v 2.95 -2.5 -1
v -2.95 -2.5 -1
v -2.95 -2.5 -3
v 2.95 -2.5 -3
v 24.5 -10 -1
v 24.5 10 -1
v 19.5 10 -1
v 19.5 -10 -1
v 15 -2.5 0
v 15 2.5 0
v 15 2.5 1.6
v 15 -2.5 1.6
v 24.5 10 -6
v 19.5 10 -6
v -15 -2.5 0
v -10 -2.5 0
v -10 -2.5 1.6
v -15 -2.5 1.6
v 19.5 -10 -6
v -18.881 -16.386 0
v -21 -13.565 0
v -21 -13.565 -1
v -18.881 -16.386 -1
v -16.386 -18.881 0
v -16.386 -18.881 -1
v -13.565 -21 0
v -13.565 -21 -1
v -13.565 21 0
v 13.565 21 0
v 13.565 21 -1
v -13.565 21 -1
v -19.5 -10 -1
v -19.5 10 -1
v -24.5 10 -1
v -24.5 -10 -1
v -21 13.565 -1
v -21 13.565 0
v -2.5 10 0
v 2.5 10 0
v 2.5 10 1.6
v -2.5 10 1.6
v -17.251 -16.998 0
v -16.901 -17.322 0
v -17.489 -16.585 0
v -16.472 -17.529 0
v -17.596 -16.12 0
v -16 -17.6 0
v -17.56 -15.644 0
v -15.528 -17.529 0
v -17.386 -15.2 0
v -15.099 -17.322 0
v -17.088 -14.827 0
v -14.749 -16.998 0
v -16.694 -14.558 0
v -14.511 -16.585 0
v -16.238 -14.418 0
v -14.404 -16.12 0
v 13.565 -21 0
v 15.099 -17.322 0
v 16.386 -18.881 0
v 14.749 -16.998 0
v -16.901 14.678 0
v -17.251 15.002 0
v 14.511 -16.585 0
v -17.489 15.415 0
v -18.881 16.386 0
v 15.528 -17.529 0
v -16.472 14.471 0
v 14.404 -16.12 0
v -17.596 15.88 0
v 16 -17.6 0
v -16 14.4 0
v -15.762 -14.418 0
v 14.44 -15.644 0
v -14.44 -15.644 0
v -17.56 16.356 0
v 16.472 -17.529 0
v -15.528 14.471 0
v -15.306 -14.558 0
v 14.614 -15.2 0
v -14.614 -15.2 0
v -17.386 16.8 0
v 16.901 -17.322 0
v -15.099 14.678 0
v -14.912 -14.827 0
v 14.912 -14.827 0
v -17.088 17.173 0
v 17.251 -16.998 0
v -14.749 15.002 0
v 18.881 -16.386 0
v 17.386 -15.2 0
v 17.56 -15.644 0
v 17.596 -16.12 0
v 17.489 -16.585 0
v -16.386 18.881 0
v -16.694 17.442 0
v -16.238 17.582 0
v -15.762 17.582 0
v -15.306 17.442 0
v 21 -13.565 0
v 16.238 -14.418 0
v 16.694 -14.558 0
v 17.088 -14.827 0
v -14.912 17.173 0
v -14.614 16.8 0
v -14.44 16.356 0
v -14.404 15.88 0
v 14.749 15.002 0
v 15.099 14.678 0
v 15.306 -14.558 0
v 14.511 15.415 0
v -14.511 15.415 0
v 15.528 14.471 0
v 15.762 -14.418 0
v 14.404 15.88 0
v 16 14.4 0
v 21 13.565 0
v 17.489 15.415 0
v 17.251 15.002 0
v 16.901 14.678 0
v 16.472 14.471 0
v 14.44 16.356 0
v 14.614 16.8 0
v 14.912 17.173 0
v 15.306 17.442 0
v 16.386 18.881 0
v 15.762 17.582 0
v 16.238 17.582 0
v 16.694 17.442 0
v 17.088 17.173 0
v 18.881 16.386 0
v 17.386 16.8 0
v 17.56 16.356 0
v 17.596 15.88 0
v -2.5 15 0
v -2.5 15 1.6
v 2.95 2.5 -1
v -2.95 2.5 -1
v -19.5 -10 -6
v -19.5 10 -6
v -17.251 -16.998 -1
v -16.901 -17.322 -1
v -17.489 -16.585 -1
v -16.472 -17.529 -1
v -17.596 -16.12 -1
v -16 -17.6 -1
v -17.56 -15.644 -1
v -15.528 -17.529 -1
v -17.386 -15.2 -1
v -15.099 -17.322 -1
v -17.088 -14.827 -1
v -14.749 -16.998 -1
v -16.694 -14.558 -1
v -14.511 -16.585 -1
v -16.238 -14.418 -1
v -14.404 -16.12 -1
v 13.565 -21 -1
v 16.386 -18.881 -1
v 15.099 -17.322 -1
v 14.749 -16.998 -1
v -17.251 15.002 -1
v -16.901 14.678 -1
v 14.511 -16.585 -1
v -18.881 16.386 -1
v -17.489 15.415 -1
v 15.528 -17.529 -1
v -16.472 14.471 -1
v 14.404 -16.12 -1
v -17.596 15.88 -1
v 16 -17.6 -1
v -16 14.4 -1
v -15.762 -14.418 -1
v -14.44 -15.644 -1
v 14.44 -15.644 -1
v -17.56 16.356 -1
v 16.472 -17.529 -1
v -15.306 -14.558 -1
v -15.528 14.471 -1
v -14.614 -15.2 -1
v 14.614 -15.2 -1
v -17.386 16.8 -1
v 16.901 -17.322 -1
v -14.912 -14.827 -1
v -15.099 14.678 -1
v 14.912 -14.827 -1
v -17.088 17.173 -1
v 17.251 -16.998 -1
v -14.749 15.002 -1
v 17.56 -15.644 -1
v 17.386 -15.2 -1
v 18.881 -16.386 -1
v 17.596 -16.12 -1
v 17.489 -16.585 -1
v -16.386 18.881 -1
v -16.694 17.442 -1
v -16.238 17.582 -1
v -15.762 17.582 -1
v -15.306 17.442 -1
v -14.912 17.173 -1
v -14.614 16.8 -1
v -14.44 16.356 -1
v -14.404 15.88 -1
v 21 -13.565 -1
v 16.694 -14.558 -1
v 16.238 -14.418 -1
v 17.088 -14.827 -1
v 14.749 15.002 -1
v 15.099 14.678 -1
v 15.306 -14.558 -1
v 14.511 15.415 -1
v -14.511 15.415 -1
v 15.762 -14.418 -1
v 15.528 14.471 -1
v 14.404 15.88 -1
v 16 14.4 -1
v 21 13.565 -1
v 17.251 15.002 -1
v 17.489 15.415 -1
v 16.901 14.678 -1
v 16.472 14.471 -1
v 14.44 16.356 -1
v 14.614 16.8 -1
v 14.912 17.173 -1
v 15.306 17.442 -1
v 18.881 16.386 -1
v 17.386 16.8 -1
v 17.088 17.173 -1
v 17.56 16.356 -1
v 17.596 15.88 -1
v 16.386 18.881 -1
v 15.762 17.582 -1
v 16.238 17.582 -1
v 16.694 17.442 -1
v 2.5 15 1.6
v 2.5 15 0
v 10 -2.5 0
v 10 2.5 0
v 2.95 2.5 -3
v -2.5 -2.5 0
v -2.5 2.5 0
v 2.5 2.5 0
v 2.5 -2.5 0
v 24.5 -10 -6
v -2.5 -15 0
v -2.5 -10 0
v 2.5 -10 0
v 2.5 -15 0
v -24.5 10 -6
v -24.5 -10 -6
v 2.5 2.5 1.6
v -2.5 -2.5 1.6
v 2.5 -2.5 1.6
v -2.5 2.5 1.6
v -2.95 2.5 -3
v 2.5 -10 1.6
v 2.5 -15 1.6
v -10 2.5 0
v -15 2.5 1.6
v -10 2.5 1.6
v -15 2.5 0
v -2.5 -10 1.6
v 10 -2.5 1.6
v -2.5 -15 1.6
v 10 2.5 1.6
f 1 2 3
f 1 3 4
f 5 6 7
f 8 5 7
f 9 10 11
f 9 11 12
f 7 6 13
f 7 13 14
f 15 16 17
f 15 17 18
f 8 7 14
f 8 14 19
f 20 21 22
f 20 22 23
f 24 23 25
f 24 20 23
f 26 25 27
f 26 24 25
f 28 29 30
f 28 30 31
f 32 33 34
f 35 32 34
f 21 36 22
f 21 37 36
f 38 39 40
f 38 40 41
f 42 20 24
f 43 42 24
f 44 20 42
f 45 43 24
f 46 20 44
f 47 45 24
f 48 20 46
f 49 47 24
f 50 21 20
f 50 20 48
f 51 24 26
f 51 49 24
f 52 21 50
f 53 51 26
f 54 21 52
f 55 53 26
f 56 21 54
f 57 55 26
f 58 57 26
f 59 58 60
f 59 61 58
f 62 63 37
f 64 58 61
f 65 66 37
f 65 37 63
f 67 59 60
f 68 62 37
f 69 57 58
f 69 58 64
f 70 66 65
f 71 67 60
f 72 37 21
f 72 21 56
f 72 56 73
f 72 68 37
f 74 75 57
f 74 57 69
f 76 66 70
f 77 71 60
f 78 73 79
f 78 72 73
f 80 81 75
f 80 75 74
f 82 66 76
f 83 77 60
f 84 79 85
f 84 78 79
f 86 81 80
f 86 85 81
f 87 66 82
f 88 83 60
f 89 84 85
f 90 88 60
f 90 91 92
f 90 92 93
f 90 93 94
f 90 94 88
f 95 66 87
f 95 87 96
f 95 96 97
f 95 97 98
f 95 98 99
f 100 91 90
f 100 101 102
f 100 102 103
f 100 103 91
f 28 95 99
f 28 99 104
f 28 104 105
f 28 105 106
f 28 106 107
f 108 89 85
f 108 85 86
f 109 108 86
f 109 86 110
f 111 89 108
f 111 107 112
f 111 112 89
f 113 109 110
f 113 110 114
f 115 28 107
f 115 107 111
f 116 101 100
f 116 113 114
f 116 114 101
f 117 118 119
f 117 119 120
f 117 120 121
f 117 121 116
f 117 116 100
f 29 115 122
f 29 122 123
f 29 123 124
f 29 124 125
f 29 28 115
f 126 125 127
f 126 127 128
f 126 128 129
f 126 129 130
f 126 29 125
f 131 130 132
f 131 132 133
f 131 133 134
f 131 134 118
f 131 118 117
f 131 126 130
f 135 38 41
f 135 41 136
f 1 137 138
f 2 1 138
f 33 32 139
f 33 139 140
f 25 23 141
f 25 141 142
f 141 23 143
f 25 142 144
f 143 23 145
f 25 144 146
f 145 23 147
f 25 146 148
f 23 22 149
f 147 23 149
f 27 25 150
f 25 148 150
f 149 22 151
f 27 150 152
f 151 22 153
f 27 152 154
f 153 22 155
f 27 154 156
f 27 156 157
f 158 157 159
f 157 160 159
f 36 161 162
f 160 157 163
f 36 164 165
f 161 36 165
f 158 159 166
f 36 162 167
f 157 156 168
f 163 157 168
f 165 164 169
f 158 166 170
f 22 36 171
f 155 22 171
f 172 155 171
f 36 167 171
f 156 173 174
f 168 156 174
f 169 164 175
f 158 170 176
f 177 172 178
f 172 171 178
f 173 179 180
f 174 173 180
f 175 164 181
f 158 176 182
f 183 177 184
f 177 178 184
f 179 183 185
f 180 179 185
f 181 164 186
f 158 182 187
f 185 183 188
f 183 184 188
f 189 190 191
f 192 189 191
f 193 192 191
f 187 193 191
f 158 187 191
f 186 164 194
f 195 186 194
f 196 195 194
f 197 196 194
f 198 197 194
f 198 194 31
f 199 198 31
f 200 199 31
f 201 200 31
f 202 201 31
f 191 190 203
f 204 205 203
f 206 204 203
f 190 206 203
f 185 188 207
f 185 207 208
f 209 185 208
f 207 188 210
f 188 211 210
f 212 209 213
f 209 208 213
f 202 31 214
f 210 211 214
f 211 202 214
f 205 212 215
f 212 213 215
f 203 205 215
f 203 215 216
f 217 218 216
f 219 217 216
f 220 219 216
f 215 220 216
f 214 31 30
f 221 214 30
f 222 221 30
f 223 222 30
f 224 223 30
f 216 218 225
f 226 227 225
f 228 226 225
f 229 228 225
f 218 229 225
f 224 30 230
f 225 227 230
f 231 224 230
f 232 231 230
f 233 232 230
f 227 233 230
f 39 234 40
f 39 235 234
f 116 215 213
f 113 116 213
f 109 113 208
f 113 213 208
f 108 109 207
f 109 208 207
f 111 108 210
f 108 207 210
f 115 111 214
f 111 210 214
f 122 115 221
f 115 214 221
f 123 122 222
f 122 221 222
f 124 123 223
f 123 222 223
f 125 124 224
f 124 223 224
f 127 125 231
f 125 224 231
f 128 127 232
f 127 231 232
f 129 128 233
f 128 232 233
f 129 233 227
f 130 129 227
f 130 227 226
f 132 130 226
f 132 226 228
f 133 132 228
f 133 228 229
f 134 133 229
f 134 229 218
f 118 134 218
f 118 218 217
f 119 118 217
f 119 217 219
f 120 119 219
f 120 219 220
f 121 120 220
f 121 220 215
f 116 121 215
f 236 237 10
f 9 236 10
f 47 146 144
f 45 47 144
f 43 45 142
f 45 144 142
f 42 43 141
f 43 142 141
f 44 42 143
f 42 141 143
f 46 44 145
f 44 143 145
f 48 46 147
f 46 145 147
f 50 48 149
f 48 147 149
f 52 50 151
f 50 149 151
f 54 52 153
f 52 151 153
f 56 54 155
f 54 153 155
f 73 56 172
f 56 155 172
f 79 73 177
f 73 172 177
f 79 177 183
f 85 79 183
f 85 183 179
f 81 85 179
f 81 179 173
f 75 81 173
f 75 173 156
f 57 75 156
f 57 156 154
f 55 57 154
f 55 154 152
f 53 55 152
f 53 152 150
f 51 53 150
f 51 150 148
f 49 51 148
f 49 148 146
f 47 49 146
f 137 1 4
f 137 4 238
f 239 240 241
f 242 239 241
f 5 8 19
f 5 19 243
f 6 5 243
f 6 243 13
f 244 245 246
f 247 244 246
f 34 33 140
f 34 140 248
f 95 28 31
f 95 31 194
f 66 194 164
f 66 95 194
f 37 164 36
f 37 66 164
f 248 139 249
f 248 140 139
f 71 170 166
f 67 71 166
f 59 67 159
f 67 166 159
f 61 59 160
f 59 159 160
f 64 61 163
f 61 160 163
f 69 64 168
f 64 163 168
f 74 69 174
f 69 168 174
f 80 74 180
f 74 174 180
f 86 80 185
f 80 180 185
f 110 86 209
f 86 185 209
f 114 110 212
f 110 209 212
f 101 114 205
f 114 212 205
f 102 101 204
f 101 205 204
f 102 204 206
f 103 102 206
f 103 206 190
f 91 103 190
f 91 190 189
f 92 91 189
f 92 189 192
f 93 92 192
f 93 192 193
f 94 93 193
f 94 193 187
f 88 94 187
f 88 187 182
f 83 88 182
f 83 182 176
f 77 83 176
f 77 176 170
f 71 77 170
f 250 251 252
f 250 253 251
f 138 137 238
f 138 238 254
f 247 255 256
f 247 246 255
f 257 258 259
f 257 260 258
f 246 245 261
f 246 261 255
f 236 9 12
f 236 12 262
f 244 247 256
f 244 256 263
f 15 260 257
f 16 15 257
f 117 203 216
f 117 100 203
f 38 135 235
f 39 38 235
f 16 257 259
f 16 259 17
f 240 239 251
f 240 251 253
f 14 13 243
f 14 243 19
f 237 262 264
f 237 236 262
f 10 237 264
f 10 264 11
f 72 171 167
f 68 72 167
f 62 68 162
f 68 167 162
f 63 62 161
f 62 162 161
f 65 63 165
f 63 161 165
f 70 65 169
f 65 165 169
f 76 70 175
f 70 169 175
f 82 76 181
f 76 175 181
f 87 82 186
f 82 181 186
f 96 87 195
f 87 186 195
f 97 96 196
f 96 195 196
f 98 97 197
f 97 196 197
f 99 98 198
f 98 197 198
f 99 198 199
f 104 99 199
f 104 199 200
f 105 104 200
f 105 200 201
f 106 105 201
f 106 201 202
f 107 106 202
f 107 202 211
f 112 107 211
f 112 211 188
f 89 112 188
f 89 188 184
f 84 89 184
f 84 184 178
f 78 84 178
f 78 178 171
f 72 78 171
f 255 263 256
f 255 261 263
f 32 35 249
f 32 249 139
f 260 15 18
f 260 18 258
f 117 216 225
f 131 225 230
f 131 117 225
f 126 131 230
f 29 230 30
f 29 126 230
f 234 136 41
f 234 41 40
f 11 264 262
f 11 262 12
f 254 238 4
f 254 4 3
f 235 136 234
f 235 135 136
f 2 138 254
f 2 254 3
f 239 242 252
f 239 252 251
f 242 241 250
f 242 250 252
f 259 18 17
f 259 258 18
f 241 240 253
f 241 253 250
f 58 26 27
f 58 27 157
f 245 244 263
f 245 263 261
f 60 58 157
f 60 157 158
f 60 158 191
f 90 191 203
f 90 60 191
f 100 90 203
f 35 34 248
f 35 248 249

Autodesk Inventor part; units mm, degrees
ref_plane "YZ Plane" through (0, 0, 0) normal (1, 0, 0) x (0, 1, 0)
ref_plane "XZ Plane" through (0, 0, 0) normal (0, 1, 0) x (-1, 0, 0)
ref_plane "XY Plane" through (0, 0, 0) normal (0, 0, 1) x (1, 0, 0)
sketch "Skizze1" plane through (0, 0, 0) normal (0, 0, 1) x (1, 0, 0)
  circle A0 centre (0, 0) radius 25
  circle A1 centre (0, 0) radius 22.6274 construction
  line L0 (-16, 16) -> (16, 16) construction
  line L1 (16, 16) -> (16, -16) construction
  line L2 (16, -16) -> (-16, -16) construction
  line L3 (-16, -16) -> (-16, 16) construction
  line L4 (-21, -21) -> (21, -21)
  line L5 (21, -21) -> (21, 21)
  line L6 (21, 21) -> (-21, 21)
  line L7 (-21, 21) -> (-21, -21)
  line L8 (-21, -21) -> (21, 21) construction
  line L9 (21, -21) -> (-21, 21) construction
  point P0 (16, 16)
  dimension "d2" = 32
  dimension "d92" = 50
  dimension "d95" = 42
extrude "Extrusion1" add sketch "Skizze1" against normal blind 1 contours A0 L5 | L5 A0 L4 L7 L6 | L6 A0 | A0 L4 | L7 A0
hole "Bohrung1" at (-16, 16, 0) at (16, 16, 0) at (16, -16, 0) at (-16, -16, 0) direction (0, 0, -1) diameter 3.2 end through all
sketch "Skizze2" plane through (0, 0, 0) normal (0, 0, 1) x (1, 0, 0)
  circle A0 centre (16, -16) radius 1.6 projected
  circle A1 centre (-16, 16) radius 1.6 projected
  circle A2 centre (16, 16) radius 1.6 projected
  circle A3 centre (-16, -16) radius 1.6 projected
  circle A4 centre (0, 0) radius 25 projected
  line L0 (-25.6213, 25.3721) -> (25.184, 25.3721) construction
  line L1 (25.184, 25.3721) -> (25.184, -25.4332) construction
  line L2 (25.184, -25.4332) -> (-25.6213, -25.4332) construction
  line L3 (-25.6213, -25.4332) -> (-25.6213, 25.3721) construction
sketch "Skizze3" plane through (0, 0, 0) normal (0, 0, 1) x (1, 0, 0)
  circle A0 centre (0, 0) radius 25 projected
  line L0 (-2.5, 2.5) -> (2.5, 2.5)
  line L1 (2.5, 2.5) -> (2.5, -2.5)
  line L2 (2.5, -2.5) -> (-2.5, -2.5)
  line L3 (-2.5, -2.5) -> (-2.5, 2.5)
  line L4 (-15, 2.5) -> (-10, 2.5)
  line L5 (-10, 2.5) -> (-10, -2.5)
  line L6 (-10, -2.5) -> (-15, -2.5)
  line L7 (-15, -2.5) -> (-15, 2.5)
  line L8 (-15, 2.5) -> (-10, -2.5) construction
  line L9 (-2.5, 2.5) -> (2.5, -2.5) construction
  line L10 (2.5, -2.5) -> (0, 0) construction
  line L11 (0, 0) -> (-12.5, 0) construction
  line L12 (-2.5, -15) -> (-2.5, -10)
  line L13 (-2.5, -10) -> (2.5, -10)
  line L14 (2.5, -10) -> (2.5, -15)
  line L15 (2.5, -15) -> (-2.5, -15)
  line L16 (15, -2.5) -> (10, -2.5)
  line L17 (10, -2.5) -> (10, 2.5)
  line L18 (10, 2.5) -> (15, 2.5)
  line L19 (15, 2.5) -> (15, -2.5)
  line L20 (2.5, 15) -> (2.5, 10)
  line L21 (2.5, 10) -> (-2.5, 10)
  line L22 (-2.5, 10) -> (-2.5, 15)
  line L23 (-2.5, 15) -> (2.5, 15)
  dimension "d24" = 5
  dimension "d25" = 12.5
  dimension "d28" = 360
extrude "Extrusion2" add sketch "Skizze3" along normal blind 1.6 separate body contours L0 L1 L2 L3 | L4 L5 L6 L7 | L12 L13 L14 L15 | L16 L17 L18 L19 | L20 L21 L22 L23
sketch "Skizze4" plane through (0, 0, -1) normal (0, 0, -1) x (-1, 0, 0)
  circle A0 centre (0, 0) radius 25 projected
  line L0 (-2.95, 2.5) -> (2.95, 2.5)
  line L1 (2.95, 2.5) -> (2.95, -2.5)
  line L2 (2.95, -2.5) -> (-2.95, -2.5)
  line L3 (-2.95, -2.5) -> (-2.95, 2.5)
  line L4 (-2.95, -2.5) -> (2.95, 2.5) construction
  dimension "d33" = 5.9
  dimension "d34" = 5
extrude "Extrusion3" add sketch "Skizze4" along normal blind 2 separate body contours L0 L1 L2 L3
sketch "Skizze5" plane through (0, 0, -1) normal (0, 0, -1) x (-1, 0, 0)
  circle A0 centre (0, 0) radius 25 projected
  line L0 (-24.5, 10) -> (-19.5, 10)
  line L1 (-19.5, 10) -> (-19.5, -10)
  line L2 (-19.5, -10) -> (-24.5, -10)
  line L3 (-24.5, -10) -> (-24.5, 10)
  line L4 (19.5, 10) -> (24.5, 10)
  line L5 (24.5, 10) -> (24.5, -10)
  line L6 (24.5, -10) -> (19.5, -10)
  line L7 (19.5, -10) -> (19.5, 10)
  line L8 (-24.5, 0) -> (24.5, 0) construction
  line L9 (-22, 10) -> (-22, -10) construction
  point P0 (0, 0)
  dimension "d38" = 20
  dimension "d39" = 5
  dimension "d40" = 22
extrude "Extrusion4" add sketch "Skizze5" along normal blind 5 contours L5 A0 L6 L7 L4 | A0 L4 L5 | L5 L6 A0 | L0 L1 L2 A0 L3 | A0 L3 L0 | L2 L3 A0 bodies 3
sketch "Skizze6" plane through (0, 0, -1) normal (0, 0, -1) x (-1, 0, 0)
  line L0 (-26.2075, 26.1914) -> (26.4628, 26.1914) construction
  line L1 (26.4628, 26.1914) -> (26.4628, -26.479) construction
  line L2 (26.4628, -26.479) -> (-26.2075, -26.479) construction
  line L3 (-26.2075, -26.479) -> (-26.2075, 26.1914) construction
sketch "Skizze7" plane through (0, 0, 0) normal (0, 0, 1) x (1, 0, 0)
  line L0 (-21, -21) -> (21, -21)
  line L1 (21, -21) -> (21, 21)
  line L2 (21, 21) -> (-21, 21)
  line L3 (-21, 21) -> (-21, -21)
  line L4 (-21, -21) -> (21, 21) construction
  line L5 (21, -21) -> (-21, 21) construction
  line L6 (-26, -26) -> (26, -26)
  line L7 (26, -26) -> (26, 26)
  line L8 (26, 26) -> (-26, 26)
  line L9 (-26, 26) -> (-26, -26)
  line L10 (-26, -26) -> (26, 26) construction
  line L11 (26, -26) -> (-26, 26) construction
  point P0 (0, 0)
  dimension "d96" = 42
  dimension "d97" = 52
extrude "Extrusion5" cut sketch "Skizze7" against normal through all bodies 1
properties part number "encoder_neu"
